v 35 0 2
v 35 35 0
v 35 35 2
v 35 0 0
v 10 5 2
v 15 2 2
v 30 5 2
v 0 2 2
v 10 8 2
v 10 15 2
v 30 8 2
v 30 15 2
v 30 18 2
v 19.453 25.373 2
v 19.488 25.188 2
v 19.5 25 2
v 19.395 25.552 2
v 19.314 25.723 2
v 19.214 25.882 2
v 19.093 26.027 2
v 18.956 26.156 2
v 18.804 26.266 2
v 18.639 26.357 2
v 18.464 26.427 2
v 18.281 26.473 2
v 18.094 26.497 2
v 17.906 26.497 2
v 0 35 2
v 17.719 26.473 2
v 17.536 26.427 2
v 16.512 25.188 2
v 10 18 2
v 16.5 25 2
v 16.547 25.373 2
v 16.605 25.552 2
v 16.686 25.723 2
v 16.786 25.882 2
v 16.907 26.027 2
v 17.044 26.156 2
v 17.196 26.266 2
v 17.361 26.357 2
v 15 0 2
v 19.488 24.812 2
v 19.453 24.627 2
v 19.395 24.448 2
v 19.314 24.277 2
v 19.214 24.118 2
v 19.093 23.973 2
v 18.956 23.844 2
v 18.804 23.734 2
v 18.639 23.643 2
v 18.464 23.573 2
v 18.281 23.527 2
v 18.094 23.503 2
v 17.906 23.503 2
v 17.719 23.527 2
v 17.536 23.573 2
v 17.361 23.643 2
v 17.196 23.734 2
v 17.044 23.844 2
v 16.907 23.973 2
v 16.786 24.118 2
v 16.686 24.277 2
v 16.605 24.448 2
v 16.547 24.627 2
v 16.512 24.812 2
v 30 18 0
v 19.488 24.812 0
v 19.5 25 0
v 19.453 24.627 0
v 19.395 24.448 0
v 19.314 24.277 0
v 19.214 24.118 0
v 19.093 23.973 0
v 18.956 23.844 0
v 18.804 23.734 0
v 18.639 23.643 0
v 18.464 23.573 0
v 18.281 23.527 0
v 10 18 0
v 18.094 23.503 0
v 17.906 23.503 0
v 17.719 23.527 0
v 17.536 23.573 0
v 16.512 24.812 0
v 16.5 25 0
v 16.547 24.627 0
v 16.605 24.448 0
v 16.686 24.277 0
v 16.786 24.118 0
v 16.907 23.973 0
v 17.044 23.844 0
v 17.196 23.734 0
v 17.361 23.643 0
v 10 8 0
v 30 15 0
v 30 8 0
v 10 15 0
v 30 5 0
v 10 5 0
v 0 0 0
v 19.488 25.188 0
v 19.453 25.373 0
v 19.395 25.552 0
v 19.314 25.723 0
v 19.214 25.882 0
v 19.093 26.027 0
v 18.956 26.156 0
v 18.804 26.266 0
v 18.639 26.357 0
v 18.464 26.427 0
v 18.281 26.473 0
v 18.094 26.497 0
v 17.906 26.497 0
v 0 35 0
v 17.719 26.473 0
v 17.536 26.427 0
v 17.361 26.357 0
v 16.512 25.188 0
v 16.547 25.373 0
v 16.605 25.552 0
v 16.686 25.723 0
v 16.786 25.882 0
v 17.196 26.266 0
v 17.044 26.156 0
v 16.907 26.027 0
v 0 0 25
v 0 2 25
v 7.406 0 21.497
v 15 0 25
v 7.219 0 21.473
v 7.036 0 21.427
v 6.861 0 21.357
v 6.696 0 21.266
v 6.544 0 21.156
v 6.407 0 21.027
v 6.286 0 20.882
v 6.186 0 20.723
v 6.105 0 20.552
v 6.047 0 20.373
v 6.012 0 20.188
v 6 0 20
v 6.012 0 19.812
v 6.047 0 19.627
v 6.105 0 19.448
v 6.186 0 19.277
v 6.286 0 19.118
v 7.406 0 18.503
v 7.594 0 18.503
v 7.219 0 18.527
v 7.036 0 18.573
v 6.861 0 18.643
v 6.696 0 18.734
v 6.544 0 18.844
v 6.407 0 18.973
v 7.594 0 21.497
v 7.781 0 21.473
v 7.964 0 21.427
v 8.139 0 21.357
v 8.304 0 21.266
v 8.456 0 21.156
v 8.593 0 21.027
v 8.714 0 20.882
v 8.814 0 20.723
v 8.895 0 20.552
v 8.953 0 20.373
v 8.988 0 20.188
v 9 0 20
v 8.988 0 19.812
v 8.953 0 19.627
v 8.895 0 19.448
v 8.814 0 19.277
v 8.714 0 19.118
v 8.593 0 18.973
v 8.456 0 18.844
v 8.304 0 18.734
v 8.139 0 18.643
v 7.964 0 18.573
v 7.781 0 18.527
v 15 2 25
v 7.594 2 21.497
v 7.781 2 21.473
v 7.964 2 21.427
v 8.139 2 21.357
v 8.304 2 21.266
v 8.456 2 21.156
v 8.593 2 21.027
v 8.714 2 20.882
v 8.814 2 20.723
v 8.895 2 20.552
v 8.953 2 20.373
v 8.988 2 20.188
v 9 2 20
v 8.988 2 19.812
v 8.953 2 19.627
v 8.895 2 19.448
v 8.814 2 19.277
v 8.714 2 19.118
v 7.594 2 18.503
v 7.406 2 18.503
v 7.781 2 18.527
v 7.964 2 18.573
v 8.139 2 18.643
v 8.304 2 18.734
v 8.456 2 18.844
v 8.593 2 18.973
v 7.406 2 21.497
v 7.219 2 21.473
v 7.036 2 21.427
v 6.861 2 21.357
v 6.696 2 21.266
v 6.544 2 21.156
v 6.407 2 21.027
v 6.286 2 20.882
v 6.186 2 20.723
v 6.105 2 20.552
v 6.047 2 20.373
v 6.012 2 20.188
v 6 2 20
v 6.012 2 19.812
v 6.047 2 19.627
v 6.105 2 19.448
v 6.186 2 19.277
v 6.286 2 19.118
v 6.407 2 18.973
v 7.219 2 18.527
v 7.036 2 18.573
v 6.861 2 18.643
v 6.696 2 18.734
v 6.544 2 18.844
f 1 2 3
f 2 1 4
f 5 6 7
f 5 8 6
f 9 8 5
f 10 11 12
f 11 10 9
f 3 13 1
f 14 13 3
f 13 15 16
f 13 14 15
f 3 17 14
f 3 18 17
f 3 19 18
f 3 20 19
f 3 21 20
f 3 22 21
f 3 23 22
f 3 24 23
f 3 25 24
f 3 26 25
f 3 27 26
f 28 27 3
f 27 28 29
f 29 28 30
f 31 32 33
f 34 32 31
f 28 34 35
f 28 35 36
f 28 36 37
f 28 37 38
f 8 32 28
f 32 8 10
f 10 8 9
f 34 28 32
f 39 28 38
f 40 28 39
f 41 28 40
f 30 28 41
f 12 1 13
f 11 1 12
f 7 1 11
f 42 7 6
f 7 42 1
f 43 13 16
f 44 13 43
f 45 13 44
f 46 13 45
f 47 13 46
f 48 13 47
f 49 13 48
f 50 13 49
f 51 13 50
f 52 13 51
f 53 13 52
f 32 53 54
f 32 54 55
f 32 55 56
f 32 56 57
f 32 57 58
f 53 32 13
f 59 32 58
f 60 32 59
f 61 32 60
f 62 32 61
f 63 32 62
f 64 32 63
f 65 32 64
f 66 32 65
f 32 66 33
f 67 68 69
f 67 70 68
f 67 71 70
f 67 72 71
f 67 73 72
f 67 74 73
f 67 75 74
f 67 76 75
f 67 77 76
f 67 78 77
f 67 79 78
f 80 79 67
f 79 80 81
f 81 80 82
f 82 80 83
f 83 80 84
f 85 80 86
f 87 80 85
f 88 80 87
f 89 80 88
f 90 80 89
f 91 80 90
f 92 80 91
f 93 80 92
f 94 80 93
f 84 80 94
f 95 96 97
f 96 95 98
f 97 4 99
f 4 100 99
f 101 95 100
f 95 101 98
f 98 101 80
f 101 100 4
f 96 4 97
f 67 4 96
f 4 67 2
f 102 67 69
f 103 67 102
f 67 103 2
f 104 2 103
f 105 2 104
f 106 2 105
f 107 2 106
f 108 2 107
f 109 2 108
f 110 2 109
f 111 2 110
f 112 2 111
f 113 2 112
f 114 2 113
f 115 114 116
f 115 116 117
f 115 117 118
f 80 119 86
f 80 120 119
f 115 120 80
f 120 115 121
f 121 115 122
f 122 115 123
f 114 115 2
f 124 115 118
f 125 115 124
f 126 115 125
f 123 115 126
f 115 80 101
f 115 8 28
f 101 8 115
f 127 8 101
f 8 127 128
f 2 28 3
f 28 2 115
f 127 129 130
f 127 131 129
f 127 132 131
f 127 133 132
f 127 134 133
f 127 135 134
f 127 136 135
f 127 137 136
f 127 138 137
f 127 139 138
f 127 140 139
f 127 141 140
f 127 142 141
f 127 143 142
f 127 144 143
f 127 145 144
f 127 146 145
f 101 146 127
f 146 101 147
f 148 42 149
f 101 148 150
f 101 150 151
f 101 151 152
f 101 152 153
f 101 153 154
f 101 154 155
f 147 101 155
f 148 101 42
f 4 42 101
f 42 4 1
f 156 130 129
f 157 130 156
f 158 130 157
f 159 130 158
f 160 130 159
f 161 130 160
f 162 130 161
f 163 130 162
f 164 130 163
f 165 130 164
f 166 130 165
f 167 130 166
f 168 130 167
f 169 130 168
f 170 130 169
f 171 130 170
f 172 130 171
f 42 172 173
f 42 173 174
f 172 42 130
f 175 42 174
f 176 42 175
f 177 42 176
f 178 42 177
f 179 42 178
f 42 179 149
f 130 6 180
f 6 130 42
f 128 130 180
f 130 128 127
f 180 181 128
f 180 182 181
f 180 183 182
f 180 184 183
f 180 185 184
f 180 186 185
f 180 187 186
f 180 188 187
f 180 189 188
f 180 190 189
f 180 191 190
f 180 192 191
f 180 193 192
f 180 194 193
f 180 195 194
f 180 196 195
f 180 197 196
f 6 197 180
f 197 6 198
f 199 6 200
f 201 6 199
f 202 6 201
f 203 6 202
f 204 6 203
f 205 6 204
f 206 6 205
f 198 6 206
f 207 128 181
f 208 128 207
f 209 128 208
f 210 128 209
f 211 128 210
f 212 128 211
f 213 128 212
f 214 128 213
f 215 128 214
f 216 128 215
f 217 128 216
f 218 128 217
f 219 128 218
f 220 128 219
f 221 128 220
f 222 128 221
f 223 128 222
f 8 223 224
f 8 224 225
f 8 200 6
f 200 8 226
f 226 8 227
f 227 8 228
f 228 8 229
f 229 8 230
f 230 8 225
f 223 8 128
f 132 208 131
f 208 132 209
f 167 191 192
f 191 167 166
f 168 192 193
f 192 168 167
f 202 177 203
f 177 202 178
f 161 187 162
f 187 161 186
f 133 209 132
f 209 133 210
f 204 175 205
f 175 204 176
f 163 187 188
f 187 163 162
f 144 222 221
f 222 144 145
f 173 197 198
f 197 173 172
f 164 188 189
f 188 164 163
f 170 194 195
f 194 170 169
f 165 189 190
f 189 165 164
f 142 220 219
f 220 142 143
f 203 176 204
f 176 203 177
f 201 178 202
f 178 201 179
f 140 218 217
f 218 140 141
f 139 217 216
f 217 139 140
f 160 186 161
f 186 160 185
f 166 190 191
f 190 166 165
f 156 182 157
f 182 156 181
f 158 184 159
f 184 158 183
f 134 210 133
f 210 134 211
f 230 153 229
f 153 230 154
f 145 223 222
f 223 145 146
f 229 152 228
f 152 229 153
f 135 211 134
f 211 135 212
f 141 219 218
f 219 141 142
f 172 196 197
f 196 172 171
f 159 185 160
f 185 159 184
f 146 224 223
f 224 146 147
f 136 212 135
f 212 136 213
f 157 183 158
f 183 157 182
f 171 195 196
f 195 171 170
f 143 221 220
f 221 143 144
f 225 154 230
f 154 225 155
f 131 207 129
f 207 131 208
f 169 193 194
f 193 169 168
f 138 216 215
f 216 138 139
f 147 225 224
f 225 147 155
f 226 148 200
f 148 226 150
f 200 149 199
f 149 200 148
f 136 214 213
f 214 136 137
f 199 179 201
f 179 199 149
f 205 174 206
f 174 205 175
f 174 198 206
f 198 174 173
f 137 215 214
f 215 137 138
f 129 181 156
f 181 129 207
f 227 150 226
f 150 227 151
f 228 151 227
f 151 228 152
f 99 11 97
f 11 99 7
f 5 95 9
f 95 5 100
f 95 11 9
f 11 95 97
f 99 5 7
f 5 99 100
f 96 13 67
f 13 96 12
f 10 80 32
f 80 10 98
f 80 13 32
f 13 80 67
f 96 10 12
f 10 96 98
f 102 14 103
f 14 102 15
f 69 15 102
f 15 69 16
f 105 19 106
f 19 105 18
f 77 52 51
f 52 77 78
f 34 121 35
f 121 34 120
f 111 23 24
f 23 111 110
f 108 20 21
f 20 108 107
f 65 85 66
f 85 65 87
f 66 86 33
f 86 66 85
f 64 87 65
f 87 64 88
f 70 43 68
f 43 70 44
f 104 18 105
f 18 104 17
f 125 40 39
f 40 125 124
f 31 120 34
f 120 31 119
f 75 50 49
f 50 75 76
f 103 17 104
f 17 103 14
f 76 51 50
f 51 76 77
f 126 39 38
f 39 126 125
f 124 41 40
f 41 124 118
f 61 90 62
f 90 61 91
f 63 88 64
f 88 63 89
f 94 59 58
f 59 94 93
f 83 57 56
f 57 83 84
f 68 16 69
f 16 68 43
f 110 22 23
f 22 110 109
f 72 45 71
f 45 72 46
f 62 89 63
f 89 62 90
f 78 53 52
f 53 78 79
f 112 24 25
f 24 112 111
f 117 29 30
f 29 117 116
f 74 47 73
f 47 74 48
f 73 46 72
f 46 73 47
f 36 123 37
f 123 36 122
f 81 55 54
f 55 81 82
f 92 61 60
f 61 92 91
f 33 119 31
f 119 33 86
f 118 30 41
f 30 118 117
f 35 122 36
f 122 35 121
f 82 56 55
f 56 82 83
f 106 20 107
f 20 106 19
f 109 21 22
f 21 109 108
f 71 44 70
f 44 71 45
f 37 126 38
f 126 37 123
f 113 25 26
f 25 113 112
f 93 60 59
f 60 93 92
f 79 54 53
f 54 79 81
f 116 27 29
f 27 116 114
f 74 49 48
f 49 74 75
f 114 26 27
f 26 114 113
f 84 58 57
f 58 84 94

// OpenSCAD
// Dreamster parametric prototype drivetrain 


// Default resolution (set it down for faster rendering)
$fn = 50;

difference () {

	union () {
		cube ([35, 35, 2]);
		cube ([15, 2, 25]);
	}

	translate ([7.5, 5, 20]) {
		rotate ([90, 0, 0]) {
			cylinder (h = 10, r = 3/2);
		}
	}

	translate ([10, 5, -1]) {
		cube ([20,3,10]);
	}

	translate ([10, 15, -1]) {
		cube ([20, 3, 10]);
	}

	translate ([18, 25, -1]) {
		cylinder (h = 10, r = 3/2);
	}

}
